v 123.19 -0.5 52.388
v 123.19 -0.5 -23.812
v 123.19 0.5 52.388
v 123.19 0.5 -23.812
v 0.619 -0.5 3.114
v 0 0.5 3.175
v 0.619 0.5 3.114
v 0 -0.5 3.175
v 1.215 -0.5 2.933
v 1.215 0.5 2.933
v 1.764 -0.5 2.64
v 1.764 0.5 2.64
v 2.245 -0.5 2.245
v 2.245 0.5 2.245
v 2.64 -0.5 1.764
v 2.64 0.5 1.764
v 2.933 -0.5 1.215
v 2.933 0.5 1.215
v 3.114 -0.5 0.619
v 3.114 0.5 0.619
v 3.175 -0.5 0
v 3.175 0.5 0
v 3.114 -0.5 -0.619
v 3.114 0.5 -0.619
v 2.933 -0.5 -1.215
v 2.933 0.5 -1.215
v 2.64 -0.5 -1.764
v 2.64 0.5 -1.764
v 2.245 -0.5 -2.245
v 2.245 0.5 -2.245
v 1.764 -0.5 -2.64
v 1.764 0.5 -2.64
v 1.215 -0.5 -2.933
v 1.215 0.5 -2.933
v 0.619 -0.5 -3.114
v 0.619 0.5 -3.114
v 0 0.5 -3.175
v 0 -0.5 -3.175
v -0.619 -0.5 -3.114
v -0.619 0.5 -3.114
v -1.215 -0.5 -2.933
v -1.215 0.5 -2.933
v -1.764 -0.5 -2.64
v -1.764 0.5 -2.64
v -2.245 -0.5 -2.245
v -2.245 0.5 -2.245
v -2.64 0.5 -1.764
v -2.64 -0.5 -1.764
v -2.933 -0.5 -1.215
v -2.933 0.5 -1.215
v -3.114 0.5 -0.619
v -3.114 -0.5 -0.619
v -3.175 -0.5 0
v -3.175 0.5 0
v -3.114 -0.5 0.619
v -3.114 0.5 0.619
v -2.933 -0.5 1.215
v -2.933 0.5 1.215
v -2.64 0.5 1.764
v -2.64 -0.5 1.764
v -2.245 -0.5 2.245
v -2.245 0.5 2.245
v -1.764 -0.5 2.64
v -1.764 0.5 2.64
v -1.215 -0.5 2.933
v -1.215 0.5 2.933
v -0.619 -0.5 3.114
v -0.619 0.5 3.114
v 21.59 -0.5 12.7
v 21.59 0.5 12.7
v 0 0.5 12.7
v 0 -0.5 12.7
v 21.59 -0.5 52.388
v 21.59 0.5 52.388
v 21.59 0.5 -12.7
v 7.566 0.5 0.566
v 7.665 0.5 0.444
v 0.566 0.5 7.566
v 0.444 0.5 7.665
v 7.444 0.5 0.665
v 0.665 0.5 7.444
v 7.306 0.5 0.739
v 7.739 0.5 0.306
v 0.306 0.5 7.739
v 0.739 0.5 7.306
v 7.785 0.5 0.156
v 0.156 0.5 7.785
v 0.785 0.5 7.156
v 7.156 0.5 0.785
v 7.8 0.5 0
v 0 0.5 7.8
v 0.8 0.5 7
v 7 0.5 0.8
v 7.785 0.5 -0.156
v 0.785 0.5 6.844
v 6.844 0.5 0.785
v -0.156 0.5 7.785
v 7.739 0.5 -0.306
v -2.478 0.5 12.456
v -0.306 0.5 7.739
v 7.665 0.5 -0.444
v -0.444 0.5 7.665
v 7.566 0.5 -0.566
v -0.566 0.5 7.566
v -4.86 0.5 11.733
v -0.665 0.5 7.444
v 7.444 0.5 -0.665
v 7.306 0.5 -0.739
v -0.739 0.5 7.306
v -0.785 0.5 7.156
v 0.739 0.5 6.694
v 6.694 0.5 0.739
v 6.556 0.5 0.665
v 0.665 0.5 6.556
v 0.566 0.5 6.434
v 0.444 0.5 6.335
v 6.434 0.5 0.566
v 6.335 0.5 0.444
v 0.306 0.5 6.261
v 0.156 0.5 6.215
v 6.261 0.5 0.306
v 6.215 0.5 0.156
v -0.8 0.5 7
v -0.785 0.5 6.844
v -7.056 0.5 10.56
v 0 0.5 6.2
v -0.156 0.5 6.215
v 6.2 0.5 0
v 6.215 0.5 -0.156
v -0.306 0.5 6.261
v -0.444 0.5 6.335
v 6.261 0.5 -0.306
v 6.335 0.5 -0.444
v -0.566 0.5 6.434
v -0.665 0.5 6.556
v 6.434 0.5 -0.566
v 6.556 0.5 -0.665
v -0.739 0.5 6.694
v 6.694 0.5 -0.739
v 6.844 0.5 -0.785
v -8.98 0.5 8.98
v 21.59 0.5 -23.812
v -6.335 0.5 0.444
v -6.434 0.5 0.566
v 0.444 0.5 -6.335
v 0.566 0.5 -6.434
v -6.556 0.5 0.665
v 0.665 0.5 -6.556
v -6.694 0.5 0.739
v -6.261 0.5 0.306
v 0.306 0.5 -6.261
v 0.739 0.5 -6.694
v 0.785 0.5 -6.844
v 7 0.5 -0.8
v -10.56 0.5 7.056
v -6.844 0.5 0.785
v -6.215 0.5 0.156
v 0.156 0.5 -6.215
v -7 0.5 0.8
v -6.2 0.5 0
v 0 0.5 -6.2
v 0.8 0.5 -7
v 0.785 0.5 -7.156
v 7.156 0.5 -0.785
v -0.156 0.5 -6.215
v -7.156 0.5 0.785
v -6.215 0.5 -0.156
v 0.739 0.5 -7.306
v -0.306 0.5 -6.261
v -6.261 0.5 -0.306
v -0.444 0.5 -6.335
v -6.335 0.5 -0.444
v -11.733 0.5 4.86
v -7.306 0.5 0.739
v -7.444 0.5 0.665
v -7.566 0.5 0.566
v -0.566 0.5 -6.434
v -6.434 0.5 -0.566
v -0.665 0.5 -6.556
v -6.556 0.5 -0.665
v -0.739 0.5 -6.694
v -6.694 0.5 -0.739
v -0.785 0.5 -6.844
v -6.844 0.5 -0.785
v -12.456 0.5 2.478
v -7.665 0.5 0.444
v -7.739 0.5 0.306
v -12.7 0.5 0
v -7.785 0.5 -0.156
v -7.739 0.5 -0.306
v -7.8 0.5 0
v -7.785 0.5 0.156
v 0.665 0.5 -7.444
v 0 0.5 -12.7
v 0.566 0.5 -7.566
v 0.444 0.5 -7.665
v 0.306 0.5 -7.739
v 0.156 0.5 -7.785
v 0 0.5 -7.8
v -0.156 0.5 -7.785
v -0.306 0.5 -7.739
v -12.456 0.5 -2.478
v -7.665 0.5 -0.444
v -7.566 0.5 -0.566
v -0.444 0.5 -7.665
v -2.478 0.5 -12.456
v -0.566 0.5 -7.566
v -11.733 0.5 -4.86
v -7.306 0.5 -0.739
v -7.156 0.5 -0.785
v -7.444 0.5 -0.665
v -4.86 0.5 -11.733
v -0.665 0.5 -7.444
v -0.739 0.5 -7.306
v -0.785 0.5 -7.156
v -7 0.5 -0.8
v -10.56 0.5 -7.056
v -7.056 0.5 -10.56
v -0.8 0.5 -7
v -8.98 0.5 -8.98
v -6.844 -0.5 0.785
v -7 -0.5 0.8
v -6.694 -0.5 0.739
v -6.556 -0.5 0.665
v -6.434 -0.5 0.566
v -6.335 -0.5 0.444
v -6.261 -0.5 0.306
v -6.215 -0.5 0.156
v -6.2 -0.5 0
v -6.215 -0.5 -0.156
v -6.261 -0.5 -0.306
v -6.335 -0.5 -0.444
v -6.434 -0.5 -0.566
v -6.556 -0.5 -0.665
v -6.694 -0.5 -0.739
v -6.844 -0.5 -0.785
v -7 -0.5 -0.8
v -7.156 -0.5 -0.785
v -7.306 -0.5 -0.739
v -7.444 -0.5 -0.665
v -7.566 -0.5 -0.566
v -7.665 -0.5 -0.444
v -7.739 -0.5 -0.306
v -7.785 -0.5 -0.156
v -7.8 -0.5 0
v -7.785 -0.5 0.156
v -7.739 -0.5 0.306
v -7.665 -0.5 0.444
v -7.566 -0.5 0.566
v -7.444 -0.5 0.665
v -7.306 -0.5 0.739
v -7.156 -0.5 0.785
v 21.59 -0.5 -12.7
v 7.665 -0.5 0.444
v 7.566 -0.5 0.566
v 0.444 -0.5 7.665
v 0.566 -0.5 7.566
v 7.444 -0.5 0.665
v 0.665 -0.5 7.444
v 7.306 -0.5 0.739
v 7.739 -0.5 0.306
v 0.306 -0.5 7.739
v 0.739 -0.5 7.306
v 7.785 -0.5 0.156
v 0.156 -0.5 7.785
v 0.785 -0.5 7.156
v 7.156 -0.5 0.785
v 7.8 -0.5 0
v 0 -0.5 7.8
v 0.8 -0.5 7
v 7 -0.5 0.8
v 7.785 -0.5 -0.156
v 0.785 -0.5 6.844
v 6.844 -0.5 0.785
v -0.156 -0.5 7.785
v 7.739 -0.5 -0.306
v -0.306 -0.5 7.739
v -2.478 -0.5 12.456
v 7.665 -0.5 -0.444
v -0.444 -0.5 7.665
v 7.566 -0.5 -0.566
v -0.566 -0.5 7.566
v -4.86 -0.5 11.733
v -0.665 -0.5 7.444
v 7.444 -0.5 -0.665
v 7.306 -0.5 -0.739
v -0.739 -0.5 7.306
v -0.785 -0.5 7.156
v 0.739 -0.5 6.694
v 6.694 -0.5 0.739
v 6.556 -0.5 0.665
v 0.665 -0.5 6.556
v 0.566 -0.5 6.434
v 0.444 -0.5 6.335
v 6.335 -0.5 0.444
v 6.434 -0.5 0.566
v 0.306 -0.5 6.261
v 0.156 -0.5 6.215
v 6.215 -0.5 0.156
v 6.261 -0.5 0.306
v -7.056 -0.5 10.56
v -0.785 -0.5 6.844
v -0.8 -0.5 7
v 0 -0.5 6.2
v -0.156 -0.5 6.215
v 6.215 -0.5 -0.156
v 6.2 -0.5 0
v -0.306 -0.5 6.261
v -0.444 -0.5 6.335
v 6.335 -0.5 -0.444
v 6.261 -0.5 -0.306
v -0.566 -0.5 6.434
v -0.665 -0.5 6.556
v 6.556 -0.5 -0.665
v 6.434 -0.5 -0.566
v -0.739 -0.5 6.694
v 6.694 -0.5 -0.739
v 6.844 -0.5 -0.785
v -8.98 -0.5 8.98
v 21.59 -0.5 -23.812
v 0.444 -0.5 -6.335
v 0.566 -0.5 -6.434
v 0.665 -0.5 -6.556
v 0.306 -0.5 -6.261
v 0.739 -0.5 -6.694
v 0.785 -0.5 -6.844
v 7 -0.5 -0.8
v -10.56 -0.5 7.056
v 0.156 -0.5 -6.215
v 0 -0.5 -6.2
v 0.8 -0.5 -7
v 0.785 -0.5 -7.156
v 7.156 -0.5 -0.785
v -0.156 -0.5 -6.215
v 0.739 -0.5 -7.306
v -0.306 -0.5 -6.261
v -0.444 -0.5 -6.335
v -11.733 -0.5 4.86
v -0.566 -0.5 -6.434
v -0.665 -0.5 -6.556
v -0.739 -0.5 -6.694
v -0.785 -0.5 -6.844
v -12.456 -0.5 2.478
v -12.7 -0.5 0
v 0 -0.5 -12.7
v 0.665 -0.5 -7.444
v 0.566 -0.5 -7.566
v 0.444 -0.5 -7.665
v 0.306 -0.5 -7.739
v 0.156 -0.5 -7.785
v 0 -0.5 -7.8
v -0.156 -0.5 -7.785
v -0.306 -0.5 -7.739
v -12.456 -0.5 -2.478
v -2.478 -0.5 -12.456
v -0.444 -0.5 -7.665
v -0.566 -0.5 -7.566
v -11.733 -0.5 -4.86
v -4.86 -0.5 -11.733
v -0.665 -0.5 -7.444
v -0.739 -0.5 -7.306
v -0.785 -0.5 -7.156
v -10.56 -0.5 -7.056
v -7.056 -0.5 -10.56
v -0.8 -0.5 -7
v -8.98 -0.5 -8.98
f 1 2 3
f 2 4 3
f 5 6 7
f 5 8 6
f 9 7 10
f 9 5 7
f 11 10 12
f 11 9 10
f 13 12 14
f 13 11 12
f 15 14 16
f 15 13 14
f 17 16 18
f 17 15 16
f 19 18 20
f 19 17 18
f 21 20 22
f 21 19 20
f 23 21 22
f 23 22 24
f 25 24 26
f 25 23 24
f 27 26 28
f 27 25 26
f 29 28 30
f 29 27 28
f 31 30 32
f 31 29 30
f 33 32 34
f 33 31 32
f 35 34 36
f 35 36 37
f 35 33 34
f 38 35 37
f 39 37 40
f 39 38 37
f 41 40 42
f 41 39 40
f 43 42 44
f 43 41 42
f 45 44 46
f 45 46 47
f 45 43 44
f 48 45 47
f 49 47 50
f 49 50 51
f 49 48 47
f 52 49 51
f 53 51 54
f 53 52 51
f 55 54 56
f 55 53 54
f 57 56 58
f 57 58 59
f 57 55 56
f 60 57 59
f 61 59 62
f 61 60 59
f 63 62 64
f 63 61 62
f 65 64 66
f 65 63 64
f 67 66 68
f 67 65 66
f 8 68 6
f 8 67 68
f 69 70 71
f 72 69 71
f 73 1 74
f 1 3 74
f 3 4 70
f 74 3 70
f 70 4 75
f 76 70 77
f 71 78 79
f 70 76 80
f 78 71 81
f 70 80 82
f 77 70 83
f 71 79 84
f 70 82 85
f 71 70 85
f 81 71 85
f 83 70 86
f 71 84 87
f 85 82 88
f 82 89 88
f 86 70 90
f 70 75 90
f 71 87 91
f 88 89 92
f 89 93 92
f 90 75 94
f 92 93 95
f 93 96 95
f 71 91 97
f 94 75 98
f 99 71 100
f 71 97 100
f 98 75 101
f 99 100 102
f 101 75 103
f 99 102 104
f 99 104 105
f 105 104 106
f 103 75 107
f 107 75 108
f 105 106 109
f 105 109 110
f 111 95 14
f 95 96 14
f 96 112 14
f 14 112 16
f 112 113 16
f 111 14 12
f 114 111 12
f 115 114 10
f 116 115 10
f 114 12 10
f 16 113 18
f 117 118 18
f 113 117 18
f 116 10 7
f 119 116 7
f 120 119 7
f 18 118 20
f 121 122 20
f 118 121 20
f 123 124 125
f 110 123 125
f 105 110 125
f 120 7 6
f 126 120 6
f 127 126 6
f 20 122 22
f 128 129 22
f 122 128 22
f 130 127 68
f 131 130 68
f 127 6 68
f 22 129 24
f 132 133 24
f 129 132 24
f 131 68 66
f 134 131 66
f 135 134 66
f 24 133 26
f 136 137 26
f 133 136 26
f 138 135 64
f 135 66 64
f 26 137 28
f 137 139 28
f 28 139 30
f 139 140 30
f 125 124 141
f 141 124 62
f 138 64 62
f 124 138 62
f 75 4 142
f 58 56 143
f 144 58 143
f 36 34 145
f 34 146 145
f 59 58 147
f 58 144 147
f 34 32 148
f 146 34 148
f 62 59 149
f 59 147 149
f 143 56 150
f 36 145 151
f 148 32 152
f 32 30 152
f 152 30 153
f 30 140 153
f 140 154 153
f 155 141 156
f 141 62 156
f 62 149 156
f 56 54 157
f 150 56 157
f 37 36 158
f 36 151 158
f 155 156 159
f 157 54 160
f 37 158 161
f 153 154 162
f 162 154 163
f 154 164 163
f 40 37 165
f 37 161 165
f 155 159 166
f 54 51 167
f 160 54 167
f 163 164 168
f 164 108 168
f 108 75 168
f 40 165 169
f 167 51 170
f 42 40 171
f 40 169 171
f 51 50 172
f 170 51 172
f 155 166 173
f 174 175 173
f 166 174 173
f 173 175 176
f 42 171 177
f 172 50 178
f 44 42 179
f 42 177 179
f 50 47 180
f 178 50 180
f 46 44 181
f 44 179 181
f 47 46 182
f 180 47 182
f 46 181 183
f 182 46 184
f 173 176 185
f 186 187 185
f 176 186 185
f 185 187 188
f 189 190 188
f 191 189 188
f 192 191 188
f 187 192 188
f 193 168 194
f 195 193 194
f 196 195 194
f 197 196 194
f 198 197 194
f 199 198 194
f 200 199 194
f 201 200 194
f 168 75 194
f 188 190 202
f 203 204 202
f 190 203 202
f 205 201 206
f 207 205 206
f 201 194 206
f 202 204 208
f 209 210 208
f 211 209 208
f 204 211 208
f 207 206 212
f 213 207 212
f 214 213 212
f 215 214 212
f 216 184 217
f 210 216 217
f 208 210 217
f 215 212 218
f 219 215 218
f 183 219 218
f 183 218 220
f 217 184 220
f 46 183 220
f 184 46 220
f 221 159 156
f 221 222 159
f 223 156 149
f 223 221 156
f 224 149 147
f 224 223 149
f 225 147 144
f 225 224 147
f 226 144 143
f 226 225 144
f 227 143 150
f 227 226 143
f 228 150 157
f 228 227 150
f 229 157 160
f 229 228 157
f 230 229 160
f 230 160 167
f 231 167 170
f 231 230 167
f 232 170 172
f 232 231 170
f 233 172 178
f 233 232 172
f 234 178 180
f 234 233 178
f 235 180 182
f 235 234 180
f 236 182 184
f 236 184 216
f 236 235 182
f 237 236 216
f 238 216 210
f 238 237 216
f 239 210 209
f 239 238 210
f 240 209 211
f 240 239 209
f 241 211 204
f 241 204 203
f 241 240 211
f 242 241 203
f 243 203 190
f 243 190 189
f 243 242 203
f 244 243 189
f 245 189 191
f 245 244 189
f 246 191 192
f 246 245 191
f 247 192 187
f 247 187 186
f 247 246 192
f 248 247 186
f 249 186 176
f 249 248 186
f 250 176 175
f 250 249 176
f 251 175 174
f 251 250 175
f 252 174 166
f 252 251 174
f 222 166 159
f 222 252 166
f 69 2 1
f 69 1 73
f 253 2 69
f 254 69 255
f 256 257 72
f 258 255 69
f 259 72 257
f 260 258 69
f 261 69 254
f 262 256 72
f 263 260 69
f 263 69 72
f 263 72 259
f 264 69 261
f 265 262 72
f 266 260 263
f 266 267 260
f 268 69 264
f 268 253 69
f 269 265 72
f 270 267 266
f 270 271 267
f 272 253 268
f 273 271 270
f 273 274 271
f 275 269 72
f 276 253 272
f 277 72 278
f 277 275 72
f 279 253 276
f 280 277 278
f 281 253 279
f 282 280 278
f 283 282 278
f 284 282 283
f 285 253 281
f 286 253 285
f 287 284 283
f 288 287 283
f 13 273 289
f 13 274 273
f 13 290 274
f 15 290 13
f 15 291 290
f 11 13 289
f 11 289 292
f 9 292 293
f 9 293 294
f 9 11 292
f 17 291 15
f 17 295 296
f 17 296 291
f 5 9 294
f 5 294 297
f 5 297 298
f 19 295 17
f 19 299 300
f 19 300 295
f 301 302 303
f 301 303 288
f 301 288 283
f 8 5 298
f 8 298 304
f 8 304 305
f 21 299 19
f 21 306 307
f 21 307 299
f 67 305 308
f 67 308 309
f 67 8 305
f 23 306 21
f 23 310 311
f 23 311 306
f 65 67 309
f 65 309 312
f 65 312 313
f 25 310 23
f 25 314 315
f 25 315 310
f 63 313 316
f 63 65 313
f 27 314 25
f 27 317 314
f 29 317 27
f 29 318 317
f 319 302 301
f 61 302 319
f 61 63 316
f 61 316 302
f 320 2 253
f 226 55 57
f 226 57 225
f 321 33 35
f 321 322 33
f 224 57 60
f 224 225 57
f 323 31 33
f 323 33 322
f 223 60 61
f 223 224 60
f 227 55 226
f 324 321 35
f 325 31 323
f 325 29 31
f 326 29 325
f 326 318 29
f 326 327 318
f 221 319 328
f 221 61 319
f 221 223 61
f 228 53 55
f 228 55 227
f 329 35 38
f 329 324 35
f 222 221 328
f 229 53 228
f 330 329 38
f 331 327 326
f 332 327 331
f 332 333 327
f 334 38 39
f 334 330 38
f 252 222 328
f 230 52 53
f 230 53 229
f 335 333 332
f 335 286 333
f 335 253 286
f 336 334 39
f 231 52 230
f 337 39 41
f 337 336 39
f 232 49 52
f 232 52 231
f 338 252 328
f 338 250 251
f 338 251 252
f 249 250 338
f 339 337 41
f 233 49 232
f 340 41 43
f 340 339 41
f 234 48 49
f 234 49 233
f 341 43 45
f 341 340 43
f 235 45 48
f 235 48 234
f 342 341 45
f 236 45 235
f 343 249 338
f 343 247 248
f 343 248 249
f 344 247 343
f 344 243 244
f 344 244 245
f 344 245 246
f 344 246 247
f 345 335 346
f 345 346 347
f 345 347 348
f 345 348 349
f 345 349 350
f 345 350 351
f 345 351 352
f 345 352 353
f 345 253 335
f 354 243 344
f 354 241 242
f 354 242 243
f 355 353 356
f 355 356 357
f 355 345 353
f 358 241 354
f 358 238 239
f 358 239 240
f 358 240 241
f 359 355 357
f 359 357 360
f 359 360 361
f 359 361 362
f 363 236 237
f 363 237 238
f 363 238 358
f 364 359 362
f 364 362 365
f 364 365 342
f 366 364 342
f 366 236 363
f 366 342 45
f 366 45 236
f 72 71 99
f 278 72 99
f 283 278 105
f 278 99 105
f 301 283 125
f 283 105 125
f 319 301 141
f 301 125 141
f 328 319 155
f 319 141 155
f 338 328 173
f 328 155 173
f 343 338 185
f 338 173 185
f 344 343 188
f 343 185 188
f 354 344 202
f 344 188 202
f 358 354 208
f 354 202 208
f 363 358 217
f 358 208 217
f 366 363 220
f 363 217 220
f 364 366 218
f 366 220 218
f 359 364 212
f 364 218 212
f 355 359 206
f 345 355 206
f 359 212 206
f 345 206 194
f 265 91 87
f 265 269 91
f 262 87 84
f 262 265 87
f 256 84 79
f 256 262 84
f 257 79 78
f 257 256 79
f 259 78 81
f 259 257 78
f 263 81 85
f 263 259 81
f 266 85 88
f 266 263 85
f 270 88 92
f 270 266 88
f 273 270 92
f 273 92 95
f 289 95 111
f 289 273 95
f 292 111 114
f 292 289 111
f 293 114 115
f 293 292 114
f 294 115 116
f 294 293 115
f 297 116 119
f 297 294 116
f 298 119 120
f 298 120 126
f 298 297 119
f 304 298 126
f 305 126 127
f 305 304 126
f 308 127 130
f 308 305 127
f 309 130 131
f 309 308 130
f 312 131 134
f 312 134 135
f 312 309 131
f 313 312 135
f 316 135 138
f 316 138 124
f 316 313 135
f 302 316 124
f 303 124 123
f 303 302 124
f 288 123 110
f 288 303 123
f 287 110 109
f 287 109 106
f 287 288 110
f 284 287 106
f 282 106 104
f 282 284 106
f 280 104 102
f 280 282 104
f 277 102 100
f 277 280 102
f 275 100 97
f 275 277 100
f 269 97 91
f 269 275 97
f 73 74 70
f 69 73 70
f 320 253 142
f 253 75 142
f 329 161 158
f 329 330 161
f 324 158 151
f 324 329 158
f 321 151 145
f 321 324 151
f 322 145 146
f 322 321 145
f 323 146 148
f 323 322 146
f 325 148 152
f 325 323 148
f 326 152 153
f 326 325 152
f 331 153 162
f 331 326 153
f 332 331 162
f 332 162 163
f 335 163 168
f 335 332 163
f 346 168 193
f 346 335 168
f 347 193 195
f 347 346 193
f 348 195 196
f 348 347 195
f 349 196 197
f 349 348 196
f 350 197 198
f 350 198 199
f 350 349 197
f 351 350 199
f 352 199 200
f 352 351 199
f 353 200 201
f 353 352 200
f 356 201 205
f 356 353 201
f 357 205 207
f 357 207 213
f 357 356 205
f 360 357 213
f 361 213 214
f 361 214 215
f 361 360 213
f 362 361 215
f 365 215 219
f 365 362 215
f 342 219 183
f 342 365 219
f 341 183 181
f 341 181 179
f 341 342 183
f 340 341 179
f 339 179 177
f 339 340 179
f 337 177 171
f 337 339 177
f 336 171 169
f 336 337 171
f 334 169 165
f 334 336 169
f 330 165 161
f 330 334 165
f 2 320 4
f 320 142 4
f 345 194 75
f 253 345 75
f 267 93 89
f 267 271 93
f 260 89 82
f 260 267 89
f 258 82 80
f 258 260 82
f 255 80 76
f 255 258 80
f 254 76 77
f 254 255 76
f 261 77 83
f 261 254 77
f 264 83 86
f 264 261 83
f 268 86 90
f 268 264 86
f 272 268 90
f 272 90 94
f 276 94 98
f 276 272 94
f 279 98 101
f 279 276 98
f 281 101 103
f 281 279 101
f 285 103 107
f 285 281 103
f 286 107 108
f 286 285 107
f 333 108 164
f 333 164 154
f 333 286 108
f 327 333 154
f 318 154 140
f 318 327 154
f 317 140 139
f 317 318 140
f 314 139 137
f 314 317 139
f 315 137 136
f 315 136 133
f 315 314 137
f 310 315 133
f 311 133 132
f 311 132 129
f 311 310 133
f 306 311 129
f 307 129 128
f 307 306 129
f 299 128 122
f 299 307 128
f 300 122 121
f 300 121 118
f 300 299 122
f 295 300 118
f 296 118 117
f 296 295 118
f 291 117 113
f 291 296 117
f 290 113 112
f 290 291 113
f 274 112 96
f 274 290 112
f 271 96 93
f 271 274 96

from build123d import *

# Parameters (mm, degrees)
SKETCH1_R           = 0.800000051
SKETCH1_R_2         = 3.175
BOSS_EXTRUDE1_DEPTH = 0.500000016


with BuildPart() as part:
    # Sketch1 → Boss-Extrude1 (new, symmetric)
    with BuildSketch(Plane(origin=(0, 0, 0), x_dir=(1, 0, 0), z_dir=(0, 1, 0))):
        with BuildLine():
            Line((0, 12.7), (21.59, 12.7))
            Line((21.59, 12.7), (21.59, 23.8125))
            Line((21.59, 23.8125), (123.19, 23.8125))
            Line((123.19, 23.8125), (123.19, -52.3875))
            Line((123.19, -52.3875), (21.59, -52.3875))
            Line((21.59, -52.3875), (21.59, -12.7))
            Line((21.59, -12.7), (0, -12.7))
            ThreePointArc((0, -12.7), (-12.7, 0), (0, 12.7))
        make_face()
        with Locations(Location((6.99999997, 0, 0), (0, 0, 270))):
            Circle(SKETCH1_R, mode=Mode.SUBTRACT)
        with Locations(Location((0, -6.99999997, 0), (0, 0, 270))):
            Circle(SKETCH1_R, mode=Mode.SUBTRACT)
        with Locations(Location((-6.99999997, 0, 0), (0, 0, 270))):
            Circle(SKETCH1_R, mode=Mode.SUBTRACT)
        with Locations(Location((0, 6.99999997, 0), (0, 0, 270))):
            Circle(SKETCH1_R, mode=Mode.SUBTRACT)
        with Locations(Location((0, 0, 0), (0, 0, 270))):
            Circle(SKETCH1_R_2, mode=Mode.SUBTRACT)
    extrude(amount=BOSS_EXTRUDE1_DEPTH, both=True)


solid = part.part
